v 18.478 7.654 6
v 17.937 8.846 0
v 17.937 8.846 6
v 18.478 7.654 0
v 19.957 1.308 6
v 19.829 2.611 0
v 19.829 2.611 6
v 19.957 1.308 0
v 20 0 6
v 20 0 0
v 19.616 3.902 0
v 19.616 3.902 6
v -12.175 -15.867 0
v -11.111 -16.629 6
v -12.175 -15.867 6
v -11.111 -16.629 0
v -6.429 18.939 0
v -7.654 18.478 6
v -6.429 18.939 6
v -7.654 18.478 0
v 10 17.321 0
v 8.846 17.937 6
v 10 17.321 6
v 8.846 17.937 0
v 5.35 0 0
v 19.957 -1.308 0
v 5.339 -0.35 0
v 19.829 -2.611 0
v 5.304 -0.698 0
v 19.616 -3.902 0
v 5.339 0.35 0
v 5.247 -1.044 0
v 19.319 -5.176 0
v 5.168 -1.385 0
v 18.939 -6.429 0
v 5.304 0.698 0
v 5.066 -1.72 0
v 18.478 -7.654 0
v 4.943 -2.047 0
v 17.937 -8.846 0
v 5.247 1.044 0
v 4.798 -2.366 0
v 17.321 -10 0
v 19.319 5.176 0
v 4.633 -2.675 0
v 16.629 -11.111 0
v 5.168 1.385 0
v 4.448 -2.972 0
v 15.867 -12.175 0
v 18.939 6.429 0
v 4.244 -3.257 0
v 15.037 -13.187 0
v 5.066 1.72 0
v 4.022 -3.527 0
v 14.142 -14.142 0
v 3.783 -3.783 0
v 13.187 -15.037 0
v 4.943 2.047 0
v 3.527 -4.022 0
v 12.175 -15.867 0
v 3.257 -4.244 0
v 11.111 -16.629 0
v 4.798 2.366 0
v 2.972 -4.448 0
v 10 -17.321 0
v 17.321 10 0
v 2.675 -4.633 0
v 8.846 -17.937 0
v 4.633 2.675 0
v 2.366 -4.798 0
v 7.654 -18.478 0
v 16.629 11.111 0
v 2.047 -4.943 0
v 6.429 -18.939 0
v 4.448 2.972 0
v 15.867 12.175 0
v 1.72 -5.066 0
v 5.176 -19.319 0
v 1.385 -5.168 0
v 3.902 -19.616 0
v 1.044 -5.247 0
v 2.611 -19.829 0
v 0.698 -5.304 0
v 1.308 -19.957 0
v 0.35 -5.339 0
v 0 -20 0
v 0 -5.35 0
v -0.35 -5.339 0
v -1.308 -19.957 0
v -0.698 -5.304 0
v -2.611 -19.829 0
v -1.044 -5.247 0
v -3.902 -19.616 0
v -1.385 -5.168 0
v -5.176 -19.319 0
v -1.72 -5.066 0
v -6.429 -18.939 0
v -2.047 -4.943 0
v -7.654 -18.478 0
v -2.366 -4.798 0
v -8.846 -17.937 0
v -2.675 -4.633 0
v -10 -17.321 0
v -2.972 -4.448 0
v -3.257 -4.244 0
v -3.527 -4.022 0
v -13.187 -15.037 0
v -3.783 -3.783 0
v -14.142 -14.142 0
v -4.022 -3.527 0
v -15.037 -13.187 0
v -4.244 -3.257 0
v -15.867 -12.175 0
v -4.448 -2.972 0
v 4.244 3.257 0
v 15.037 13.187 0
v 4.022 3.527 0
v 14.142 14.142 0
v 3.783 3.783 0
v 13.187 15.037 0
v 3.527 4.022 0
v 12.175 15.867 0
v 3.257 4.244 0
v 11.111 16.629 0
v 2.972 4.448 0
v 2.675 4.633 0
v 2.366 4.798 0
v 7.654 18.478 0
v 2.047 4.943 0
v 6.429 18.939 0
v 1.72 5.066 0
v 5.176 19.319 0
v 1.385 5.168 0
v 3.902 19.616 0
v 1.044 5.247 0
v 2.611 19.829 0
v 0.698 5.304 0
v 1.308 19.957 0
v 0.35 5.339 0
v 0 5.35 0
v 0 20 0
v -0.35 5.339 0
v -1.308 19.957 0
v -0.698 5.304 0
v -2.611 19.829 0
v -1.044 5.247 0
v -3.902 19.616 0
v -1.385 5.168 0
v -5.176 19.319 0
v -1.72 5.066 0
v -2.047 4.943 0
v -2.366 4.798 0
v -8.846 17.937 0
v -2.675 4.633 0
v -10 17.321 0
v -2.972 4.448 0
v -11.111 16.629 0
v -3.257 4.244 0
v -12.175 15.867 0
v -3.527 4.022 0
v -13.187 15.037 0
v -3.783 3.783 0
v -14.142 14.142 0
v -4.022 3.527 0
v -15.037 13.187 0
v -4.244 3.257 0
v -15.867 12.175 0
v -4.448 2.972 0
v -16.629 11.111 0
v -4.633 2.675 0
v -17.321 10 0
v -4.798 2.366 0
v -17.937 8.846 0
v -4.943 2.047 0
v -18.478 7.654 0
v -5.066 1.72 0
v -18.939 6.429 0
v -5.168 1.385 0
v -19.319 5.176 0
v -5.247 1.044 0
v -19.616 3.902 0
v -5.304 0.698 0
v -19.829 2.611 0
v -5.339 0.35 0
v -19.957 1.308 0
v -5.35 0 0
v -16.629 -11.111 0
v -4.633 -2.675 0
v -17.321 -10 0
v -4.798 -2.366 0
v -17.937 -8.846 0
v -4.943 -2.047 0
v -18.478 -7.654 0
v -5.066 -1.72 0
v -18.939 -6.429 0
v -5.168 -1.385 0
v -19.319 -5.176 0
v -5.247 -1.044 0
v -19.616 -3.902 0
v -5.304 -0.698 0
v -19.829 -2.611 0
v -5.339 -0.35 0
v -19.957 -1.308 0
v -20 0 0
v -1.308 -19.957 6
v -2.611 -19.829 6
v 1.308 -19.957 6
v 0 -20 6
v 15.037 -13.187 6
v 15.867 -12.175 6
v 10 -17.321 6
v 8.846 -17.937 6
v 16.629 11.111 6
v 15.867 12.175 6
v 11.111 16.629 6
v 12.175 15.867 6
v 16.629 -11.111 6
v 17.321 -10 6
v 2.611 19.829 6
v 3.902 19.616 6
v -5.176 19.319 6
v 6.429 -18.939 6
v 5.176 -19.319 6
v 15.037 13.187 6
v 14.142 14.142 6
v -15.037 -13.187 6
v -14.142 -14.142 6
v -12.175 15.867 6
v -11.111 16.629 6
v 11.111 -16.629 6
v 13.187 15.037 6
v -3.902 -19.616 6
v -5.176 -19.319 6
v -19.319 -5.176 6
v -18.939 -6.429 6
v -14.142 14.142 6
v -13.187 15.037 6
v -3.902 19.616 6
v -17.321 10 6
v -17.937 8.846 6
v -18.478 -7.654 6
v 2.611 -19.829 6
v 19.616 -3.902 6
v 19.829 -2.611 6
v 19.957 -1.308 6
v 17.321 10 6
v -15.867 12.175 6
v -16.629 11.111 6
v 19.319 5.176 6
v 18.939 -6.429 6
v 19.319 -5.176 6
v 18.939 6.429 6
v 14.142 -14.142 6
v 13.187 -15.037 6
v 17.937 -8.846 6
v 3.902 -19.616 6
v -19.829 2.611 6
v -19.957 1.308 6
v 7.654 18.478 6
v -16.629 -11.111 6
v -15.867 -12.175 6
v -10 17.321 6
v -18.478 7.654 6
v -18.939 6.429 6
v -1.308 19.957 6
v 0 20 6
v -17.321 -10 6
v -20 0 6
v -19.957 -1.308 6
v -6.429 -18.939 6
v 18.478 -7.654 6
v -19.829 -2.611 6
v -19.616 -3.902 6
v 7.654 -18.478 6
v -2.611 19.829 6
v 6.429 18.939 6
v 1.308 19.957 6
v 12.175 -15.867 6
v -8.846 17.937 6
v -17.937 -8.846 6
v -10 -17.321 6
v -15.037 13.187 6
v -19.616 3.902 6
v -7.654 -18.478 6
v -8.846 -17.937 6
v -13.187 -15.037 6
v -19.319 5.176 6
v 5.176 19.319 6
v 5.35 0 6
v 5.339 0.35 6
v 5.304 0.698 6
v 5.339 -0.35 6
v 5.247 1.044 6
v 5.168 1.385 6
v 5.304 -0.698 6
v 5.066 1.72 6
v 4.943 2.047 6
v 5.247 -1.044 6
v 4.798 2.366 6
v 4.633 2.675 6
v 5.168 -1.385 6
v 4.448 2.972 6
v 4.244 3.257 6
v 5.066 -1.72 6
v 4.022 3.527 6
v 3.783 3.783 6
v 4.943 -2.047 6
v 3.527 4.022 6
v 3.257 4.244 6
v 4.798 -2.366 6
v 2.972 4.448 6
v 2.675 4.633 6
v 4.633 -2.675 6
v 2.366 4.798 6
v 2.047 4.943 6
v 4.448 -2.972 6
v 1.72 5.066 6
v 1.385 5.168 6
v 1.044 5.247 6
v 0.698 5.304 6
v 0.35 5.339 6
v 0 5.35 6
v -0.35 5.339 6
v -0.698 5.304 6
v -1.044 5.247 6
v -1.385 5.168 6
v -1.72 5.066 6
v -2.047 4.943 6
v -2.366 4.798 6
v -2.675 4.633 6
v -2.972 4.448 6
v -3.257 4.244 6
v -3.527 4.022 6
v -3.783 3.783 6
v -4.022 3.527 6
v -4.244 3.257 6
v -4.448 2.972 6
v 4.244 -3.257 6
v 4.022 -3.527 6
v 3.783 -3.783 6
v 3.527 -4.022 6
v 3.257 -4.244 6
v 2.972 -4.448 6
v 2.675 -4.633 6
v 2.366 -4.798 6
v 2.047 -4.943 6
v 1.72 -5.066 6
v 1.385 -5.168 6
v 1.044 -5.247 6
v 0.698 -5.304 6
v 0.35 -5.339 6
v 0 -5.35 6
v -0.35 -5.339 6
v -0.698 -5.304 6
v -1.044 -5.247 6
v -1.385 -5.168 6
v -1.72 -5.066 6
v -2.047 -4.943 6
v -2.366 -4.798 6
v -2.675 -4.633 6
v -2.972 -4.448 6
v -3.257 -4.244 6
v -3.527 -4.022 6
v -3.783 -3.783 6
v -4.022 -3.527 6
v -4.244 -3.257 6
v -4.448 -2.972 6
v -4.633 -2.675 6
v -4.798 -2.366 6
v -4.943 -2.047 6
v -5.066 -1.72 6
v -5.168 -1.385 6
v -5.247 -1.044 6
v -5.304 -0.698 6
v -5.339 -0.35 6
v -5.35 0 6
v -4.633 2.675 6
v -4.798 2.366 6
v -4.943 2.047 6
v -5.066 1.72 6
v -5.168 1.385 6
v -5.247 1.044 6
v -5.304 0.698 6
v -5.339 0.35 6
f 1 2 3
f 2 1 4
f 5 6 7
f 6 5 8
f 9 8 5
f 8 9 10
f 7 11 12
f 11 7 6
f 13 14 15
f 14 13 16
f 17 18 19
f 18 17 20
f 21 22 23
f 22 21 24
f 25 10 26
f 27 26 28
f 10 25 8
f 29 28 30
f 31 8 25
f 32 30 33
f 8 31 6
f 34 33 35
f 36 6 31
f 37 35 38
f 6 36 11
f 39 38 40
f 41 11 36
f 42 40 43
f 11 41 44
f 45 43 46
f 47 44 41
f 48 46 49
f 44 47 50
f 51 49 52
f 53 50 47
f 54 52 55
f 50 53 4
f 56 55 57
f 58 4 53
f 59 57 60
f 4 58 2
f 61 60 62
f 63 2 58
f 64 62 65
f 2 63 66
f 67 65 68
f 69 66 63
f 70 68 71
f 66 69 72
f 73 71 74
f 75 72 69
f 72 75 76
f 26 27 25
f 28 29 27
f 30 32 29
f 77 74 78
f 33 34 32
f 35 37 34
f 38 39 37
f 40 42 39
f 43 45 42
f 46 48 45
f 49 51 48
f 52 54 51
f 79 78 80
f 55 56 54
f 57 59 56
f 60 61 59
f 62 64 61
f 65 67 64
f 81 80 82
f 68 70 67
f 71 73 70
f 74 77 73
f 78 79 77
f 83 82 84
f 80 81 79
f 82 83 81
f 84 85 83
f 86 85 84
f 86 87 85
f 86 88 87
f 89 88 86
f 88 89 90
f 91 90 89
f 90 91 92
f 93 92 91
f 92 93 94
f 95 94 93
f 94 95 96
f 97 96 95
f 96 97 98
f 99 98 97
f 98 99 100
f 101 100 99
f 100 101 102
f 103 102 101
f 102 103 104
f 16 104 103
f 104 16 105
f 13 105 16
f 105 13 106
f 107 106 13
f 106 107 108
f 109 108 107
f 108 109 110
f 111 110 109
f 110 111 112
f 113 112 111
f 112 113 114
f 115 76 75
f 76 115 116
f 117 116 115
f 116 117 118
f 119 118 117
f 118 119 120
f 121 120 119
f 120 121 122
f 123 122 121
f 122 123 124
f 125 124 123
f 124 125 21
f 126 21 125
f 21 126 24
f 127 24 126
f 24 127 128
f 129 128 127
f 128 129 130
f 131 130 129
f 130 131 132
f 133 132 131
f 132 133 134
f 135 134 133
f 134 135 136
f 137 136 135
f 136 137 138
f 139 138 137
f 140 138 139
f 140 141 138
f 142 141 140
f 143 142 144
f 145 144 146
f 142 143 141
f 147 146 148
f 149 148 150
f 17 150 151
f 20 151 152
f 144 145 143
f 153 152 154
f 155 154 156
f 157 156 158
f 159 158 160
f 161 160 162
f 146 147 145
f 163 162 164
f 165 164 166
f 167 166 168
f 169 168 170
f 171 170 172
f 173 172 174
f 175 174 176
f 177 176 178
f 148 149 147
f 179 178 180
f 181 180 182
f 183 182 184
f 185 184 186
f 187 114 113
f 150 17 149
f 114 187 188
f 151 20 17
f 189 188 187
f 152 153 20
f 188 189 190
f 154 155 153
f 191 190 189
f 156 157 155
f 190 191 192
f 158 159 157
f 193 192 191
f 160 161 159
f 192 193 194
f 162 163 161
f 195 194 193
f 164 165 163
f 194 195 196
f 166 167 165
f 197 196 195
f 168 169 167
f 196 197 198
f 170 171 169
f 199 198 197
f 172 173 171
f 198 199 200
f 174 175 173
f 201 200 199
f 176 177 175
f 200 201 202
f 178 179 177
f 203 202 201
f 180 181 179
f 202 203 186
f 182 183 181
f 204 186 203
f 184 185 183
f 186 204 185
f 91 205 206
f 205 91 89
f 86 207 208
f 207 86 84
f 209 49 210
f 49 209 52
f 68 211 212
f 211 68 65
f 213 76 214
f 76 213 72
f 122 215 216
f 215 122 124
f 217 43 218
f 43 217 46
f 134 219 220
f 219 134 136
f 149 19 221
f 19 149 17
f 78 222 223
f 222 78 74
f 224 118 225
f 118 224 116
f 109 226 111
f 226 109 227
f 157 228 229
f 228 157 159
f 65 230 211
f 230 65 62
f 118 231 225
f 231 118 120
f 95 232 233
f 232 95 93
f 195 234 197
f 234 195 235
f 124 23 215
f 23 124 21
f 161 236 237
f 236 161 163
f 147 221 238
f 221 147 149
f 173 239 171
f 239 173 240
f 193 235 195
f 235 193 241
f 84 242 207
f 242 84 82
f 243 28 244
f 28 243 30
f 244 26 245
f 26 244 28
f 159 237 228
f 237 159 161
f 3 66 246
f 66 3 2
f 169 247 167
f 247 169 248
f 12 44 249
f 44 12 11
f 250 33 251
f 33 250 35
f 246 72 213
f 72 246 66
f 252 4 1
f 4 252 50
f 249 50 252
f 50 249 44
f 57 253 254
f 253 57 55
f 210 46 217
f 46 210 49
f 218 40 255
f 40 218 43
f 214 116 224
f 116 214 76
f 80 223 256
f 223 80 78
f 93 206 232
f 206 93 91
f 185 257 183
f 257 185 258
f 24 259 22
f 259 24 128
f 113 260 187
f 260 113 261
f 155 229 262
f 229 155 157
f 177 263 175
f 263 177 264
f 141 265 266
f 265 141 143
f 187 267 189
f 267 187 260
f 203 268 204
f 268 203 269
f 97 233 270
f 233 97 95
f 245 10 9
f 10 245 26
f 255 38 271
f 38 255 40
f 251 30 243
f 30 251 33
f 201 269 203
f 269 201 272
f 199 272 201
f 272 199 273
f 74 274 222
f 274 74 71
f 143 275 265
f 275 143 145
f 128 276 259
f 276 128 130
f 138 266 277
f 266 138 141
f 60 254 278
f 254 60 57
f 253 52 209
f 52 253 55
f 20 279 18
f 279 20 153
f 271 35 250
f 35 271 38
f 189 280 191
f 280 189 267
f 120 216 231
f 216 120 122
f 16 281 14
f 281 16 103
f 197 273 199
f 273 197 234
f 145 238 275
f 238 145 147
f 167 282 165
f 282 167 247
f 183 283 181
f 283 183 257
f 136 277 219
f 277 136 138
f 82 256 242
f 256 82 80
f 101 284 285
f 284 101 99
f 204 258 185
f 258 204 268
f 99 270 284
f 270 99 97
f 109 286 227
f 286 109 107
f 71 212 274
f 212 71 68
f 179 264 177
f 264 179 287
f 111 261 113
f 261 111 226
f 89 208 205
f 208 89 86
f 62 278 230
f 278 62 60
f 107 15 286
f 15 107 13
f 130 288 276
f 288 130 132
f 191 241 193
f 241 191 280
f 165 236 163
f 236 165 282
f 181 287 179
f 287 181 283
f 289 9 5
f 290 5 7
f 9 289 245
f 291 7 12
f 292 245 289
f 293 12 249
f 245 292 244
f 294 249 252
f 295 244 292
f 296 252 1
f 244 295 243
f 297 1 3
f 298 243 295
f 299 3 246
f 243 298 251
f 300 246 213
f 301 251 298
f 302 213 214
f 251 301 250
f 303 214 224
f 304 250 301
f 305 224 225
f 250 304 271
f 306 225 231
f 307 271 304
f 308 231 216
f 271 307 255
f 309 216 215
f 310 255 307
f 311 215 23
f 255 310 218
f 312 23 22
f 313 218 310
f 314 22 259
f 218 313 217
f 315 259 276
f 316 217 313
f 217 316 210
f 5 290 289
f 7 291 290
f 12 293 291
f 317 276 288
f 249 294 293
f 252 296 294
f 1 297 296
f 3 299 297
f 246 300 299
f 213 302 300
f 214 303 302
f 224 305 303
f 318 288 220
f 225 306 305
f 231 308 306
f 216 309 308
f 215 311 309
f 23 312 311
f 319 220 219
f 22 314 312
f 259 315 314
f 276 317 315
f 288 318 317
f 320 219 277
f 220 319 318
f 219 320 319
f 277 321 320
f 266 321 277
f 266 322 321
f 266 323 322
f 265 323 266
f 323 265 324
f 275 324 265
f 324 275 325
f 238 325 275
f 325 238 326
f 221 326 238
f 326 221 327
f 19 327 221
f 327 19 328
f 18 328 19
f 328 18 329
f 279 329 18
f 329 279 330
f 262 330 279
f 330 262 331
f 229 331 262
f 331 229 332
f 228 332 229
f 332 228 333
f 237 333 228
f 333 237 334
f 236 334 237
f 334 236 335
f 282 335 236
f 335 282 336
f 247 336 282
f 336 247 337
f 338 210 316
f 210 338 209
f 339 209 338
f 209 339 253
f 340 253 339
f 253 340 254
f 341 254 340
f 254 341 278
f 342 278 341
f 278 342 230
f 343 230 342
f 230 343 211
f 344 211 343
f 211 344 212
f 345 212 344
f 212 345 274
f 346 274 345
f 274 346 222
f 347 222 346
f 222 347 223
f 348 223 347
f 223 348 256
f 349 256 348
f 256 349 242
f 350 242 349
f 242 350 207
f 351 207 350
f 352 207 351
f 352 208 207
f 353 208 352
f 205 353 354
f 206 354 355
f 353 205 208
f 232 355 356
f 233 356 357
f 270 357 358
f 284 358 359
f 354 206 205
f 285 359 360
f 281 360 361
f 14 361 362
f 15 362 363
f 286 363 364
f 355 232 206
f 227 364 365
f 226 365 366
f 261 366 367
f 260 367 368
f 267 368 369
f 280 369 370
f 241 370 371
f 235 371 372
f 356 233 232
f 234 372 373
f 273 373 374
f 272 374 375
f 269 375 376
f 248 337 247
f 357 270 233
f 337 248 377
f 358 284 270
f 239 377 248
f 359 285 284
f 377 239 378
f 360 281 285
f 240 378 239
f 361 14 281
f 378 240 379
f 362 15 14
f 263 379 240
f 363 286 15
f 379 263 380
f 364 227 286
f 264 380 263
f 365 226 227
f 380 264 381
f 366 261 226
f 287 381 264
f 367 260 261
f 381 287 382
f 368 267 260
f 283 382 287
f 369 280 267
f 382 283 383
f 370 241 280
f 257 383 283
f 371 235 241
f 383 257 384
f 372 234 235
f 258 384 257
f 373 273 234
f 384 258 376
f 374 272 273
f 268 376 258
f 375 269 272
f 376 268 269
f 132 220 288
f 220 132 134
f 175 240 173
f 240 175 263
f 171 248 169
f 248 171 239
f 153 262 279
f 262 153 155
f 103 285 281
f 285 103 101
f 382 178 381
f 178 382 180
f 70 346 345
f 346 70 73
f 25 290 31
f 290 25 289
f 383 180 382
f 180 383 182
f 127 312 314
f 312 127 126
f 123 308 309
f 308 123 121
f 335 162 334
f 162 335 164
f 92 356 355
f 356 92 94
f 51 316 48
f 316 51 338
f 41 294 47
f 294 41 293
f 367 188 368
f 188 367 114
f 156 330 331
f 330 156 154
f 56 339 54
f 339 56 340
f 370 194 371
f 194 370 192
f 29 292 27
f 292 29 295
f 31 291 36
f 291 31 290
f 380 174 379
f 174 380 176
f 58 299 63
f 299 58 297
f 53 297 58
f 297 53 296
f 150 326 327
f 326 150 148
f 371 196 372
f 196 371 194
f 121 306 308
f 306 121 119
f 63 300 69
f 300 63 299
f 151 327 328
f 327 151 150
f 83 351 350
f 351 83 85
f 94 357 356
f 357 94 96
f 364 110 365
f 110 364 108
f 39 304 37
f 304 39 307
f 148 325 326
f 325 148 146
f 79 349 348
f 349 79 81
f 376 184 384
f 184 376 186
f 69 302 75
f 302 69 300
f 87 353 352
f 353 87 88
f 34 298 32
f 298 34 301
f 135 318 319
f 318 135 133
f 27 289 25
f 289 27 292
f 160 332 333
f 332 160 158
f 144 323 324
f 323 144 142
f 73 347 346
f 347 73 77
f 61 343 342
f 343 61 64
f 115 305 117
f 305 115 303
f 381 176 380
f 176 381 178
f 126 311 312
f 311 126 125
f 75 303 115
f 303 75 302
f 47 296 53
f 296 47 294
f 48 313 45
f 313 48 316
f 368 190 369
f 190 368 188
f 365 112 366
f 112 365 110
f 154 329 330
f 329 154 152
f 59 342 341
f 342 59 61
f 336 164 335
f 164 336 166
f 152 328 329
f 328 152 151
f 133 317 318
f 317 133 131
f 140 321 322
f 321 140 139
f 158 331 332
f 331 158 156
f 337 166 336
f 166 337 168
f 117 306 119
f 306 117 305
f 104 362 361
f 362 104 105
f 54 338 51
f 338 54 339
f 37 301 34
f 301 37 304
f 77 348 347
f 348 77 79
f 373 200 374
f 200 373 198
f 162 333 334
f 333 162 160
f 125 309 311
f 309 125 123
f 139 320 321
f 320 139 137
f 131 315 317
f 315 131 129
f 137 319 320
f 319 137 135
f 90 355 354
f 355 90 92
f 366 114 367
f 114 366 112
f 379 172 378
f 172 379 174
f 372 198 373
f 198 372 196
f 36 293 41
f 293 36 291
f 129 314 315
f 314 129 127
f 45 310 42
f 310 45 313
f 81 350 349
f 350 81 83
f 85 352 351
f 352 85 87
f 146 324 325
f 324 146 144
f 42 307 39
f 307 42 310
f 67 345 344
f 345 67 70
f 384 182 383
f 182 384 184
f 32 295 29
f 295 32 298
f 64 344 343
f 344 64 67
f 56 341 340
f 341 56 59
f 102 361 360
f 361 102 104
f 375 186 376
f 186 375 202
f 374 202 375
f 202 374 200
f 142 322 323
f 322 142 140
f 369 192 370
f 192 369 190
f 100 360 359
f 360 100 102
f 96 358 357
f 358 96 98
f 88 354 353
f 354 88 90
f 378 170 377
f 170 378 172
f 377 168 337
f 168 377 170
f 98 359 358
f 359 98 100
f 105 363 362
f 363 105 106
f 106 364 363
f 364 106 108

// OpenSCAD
// file: respool_common.scad
// Respooler — a source-spool stand. Winds wick or wire onto the printed spool.
//
// THERE IS NO CRANK AND NO DRIVEN STATION, BECAUSE NEITHER IS NEEDED. The
// printed spool already spins in the wick holder's own brackets — that is what
// its 0.30 mm spigot and 0.40 mm journal clearances are for. Winding 15 m of
// 3 mm braid is only ~126–149 turns on a ⌀56 flange you can grip, so you turn it
// by hand and this stand just feeds it.
//
// That collapsed the whole jig. An earlier sketch had a crank, a driven upright
// and two flats milled on the spool's journal to drive it — a spool revision for
// a problem that does not exist.
//
// THE EXISTING HOLDER CANNOT HOST THE SOURCE SPOOLS. Both fail, for different
// reasons, which is why this stand exists at all:
//
//   solder braid   44.75 wide  vs the holder's 34.25 mm span   — too wide
//   micro wire     ⌀69.13      vs the holder's ⌀60 envelope    — too big
//
// All source-spool numbers are calipered (2026-09-07):
//
//   solder braid       ⌀48.50 x 44.75 wide, bore 10.25
//   micro wire #1/#2   ⌀69.13 x 13.50 wide, bore 11.30
include <../lib/gridfinity.scad>

NX = 2; NY = 2;          // 2x2 is 83.5 across — clears the ⌀69.13 spool
BASE_H    = 8;           // solid base under the post

POST_D    = 9.9;         // clears BOTH bores: 0.35 in the braid's 10.25,
                         //   1.40 in the wire's 11.30
POST_H    = 56;          // widest spool 44.75 + washer + loading clearance
POST_CHAM = 1.2;         // lead-in so a spool drops on without fishing for it
POST_SINK = 1.5;         // how far the post buries into the base — a PARTIAL
                         //   area join, so it overlaps rather than butting

WASHER_D  = 40;          // sits on the spool's top flange
WASHER_H  = 6;
WASHER_CLR = 0.4;        // free on the post, it must not bind

EPS = 0.01;

assert(NX*GF - 0.5 > 69.13, "Base is narrower than the largest source spool.");
assert(POST_D < 10.25, "Post must clear the tighter of the two spool bores.");
assert(POST_H > 44.75 + WASHER_H, "Post is too short for the widest spool plus its washer.");
echo(str("post ⌀", POST_D, " x ", POST_H, " above a ", NX*GF-0.5, " mm base"));
// main file
// respool_drag_washer — drops over the post onto the source spool's top flange.
//
// THIS IS THE PART THAT MAKES THE WIND TIGHT. Without drag the source spool
// overruns every time you pause and the braid births a nest. Its own weight
// supplies the drag, which is why it is a solid disc and not a spring: a printed
// spring at this size relaxes, and this has to work the same on a 44.75 mm spool
// and a 13.50 mm one. Weight does; preload does not.
//
// Want more drag? Print it solid, or rest a coin on it.
//
// PRINT: flat, as emitted. No supports.
include <respool_common.scad>
$fn = 96;
difference() {
    cylinder(d = WASHER_D, h = WASHER_H);
    translate([0, 0, -EPS])
        cylinder(d = POST_D + 2*WASHER_CLR, h = WASHER_H + 2*EPS);
}
